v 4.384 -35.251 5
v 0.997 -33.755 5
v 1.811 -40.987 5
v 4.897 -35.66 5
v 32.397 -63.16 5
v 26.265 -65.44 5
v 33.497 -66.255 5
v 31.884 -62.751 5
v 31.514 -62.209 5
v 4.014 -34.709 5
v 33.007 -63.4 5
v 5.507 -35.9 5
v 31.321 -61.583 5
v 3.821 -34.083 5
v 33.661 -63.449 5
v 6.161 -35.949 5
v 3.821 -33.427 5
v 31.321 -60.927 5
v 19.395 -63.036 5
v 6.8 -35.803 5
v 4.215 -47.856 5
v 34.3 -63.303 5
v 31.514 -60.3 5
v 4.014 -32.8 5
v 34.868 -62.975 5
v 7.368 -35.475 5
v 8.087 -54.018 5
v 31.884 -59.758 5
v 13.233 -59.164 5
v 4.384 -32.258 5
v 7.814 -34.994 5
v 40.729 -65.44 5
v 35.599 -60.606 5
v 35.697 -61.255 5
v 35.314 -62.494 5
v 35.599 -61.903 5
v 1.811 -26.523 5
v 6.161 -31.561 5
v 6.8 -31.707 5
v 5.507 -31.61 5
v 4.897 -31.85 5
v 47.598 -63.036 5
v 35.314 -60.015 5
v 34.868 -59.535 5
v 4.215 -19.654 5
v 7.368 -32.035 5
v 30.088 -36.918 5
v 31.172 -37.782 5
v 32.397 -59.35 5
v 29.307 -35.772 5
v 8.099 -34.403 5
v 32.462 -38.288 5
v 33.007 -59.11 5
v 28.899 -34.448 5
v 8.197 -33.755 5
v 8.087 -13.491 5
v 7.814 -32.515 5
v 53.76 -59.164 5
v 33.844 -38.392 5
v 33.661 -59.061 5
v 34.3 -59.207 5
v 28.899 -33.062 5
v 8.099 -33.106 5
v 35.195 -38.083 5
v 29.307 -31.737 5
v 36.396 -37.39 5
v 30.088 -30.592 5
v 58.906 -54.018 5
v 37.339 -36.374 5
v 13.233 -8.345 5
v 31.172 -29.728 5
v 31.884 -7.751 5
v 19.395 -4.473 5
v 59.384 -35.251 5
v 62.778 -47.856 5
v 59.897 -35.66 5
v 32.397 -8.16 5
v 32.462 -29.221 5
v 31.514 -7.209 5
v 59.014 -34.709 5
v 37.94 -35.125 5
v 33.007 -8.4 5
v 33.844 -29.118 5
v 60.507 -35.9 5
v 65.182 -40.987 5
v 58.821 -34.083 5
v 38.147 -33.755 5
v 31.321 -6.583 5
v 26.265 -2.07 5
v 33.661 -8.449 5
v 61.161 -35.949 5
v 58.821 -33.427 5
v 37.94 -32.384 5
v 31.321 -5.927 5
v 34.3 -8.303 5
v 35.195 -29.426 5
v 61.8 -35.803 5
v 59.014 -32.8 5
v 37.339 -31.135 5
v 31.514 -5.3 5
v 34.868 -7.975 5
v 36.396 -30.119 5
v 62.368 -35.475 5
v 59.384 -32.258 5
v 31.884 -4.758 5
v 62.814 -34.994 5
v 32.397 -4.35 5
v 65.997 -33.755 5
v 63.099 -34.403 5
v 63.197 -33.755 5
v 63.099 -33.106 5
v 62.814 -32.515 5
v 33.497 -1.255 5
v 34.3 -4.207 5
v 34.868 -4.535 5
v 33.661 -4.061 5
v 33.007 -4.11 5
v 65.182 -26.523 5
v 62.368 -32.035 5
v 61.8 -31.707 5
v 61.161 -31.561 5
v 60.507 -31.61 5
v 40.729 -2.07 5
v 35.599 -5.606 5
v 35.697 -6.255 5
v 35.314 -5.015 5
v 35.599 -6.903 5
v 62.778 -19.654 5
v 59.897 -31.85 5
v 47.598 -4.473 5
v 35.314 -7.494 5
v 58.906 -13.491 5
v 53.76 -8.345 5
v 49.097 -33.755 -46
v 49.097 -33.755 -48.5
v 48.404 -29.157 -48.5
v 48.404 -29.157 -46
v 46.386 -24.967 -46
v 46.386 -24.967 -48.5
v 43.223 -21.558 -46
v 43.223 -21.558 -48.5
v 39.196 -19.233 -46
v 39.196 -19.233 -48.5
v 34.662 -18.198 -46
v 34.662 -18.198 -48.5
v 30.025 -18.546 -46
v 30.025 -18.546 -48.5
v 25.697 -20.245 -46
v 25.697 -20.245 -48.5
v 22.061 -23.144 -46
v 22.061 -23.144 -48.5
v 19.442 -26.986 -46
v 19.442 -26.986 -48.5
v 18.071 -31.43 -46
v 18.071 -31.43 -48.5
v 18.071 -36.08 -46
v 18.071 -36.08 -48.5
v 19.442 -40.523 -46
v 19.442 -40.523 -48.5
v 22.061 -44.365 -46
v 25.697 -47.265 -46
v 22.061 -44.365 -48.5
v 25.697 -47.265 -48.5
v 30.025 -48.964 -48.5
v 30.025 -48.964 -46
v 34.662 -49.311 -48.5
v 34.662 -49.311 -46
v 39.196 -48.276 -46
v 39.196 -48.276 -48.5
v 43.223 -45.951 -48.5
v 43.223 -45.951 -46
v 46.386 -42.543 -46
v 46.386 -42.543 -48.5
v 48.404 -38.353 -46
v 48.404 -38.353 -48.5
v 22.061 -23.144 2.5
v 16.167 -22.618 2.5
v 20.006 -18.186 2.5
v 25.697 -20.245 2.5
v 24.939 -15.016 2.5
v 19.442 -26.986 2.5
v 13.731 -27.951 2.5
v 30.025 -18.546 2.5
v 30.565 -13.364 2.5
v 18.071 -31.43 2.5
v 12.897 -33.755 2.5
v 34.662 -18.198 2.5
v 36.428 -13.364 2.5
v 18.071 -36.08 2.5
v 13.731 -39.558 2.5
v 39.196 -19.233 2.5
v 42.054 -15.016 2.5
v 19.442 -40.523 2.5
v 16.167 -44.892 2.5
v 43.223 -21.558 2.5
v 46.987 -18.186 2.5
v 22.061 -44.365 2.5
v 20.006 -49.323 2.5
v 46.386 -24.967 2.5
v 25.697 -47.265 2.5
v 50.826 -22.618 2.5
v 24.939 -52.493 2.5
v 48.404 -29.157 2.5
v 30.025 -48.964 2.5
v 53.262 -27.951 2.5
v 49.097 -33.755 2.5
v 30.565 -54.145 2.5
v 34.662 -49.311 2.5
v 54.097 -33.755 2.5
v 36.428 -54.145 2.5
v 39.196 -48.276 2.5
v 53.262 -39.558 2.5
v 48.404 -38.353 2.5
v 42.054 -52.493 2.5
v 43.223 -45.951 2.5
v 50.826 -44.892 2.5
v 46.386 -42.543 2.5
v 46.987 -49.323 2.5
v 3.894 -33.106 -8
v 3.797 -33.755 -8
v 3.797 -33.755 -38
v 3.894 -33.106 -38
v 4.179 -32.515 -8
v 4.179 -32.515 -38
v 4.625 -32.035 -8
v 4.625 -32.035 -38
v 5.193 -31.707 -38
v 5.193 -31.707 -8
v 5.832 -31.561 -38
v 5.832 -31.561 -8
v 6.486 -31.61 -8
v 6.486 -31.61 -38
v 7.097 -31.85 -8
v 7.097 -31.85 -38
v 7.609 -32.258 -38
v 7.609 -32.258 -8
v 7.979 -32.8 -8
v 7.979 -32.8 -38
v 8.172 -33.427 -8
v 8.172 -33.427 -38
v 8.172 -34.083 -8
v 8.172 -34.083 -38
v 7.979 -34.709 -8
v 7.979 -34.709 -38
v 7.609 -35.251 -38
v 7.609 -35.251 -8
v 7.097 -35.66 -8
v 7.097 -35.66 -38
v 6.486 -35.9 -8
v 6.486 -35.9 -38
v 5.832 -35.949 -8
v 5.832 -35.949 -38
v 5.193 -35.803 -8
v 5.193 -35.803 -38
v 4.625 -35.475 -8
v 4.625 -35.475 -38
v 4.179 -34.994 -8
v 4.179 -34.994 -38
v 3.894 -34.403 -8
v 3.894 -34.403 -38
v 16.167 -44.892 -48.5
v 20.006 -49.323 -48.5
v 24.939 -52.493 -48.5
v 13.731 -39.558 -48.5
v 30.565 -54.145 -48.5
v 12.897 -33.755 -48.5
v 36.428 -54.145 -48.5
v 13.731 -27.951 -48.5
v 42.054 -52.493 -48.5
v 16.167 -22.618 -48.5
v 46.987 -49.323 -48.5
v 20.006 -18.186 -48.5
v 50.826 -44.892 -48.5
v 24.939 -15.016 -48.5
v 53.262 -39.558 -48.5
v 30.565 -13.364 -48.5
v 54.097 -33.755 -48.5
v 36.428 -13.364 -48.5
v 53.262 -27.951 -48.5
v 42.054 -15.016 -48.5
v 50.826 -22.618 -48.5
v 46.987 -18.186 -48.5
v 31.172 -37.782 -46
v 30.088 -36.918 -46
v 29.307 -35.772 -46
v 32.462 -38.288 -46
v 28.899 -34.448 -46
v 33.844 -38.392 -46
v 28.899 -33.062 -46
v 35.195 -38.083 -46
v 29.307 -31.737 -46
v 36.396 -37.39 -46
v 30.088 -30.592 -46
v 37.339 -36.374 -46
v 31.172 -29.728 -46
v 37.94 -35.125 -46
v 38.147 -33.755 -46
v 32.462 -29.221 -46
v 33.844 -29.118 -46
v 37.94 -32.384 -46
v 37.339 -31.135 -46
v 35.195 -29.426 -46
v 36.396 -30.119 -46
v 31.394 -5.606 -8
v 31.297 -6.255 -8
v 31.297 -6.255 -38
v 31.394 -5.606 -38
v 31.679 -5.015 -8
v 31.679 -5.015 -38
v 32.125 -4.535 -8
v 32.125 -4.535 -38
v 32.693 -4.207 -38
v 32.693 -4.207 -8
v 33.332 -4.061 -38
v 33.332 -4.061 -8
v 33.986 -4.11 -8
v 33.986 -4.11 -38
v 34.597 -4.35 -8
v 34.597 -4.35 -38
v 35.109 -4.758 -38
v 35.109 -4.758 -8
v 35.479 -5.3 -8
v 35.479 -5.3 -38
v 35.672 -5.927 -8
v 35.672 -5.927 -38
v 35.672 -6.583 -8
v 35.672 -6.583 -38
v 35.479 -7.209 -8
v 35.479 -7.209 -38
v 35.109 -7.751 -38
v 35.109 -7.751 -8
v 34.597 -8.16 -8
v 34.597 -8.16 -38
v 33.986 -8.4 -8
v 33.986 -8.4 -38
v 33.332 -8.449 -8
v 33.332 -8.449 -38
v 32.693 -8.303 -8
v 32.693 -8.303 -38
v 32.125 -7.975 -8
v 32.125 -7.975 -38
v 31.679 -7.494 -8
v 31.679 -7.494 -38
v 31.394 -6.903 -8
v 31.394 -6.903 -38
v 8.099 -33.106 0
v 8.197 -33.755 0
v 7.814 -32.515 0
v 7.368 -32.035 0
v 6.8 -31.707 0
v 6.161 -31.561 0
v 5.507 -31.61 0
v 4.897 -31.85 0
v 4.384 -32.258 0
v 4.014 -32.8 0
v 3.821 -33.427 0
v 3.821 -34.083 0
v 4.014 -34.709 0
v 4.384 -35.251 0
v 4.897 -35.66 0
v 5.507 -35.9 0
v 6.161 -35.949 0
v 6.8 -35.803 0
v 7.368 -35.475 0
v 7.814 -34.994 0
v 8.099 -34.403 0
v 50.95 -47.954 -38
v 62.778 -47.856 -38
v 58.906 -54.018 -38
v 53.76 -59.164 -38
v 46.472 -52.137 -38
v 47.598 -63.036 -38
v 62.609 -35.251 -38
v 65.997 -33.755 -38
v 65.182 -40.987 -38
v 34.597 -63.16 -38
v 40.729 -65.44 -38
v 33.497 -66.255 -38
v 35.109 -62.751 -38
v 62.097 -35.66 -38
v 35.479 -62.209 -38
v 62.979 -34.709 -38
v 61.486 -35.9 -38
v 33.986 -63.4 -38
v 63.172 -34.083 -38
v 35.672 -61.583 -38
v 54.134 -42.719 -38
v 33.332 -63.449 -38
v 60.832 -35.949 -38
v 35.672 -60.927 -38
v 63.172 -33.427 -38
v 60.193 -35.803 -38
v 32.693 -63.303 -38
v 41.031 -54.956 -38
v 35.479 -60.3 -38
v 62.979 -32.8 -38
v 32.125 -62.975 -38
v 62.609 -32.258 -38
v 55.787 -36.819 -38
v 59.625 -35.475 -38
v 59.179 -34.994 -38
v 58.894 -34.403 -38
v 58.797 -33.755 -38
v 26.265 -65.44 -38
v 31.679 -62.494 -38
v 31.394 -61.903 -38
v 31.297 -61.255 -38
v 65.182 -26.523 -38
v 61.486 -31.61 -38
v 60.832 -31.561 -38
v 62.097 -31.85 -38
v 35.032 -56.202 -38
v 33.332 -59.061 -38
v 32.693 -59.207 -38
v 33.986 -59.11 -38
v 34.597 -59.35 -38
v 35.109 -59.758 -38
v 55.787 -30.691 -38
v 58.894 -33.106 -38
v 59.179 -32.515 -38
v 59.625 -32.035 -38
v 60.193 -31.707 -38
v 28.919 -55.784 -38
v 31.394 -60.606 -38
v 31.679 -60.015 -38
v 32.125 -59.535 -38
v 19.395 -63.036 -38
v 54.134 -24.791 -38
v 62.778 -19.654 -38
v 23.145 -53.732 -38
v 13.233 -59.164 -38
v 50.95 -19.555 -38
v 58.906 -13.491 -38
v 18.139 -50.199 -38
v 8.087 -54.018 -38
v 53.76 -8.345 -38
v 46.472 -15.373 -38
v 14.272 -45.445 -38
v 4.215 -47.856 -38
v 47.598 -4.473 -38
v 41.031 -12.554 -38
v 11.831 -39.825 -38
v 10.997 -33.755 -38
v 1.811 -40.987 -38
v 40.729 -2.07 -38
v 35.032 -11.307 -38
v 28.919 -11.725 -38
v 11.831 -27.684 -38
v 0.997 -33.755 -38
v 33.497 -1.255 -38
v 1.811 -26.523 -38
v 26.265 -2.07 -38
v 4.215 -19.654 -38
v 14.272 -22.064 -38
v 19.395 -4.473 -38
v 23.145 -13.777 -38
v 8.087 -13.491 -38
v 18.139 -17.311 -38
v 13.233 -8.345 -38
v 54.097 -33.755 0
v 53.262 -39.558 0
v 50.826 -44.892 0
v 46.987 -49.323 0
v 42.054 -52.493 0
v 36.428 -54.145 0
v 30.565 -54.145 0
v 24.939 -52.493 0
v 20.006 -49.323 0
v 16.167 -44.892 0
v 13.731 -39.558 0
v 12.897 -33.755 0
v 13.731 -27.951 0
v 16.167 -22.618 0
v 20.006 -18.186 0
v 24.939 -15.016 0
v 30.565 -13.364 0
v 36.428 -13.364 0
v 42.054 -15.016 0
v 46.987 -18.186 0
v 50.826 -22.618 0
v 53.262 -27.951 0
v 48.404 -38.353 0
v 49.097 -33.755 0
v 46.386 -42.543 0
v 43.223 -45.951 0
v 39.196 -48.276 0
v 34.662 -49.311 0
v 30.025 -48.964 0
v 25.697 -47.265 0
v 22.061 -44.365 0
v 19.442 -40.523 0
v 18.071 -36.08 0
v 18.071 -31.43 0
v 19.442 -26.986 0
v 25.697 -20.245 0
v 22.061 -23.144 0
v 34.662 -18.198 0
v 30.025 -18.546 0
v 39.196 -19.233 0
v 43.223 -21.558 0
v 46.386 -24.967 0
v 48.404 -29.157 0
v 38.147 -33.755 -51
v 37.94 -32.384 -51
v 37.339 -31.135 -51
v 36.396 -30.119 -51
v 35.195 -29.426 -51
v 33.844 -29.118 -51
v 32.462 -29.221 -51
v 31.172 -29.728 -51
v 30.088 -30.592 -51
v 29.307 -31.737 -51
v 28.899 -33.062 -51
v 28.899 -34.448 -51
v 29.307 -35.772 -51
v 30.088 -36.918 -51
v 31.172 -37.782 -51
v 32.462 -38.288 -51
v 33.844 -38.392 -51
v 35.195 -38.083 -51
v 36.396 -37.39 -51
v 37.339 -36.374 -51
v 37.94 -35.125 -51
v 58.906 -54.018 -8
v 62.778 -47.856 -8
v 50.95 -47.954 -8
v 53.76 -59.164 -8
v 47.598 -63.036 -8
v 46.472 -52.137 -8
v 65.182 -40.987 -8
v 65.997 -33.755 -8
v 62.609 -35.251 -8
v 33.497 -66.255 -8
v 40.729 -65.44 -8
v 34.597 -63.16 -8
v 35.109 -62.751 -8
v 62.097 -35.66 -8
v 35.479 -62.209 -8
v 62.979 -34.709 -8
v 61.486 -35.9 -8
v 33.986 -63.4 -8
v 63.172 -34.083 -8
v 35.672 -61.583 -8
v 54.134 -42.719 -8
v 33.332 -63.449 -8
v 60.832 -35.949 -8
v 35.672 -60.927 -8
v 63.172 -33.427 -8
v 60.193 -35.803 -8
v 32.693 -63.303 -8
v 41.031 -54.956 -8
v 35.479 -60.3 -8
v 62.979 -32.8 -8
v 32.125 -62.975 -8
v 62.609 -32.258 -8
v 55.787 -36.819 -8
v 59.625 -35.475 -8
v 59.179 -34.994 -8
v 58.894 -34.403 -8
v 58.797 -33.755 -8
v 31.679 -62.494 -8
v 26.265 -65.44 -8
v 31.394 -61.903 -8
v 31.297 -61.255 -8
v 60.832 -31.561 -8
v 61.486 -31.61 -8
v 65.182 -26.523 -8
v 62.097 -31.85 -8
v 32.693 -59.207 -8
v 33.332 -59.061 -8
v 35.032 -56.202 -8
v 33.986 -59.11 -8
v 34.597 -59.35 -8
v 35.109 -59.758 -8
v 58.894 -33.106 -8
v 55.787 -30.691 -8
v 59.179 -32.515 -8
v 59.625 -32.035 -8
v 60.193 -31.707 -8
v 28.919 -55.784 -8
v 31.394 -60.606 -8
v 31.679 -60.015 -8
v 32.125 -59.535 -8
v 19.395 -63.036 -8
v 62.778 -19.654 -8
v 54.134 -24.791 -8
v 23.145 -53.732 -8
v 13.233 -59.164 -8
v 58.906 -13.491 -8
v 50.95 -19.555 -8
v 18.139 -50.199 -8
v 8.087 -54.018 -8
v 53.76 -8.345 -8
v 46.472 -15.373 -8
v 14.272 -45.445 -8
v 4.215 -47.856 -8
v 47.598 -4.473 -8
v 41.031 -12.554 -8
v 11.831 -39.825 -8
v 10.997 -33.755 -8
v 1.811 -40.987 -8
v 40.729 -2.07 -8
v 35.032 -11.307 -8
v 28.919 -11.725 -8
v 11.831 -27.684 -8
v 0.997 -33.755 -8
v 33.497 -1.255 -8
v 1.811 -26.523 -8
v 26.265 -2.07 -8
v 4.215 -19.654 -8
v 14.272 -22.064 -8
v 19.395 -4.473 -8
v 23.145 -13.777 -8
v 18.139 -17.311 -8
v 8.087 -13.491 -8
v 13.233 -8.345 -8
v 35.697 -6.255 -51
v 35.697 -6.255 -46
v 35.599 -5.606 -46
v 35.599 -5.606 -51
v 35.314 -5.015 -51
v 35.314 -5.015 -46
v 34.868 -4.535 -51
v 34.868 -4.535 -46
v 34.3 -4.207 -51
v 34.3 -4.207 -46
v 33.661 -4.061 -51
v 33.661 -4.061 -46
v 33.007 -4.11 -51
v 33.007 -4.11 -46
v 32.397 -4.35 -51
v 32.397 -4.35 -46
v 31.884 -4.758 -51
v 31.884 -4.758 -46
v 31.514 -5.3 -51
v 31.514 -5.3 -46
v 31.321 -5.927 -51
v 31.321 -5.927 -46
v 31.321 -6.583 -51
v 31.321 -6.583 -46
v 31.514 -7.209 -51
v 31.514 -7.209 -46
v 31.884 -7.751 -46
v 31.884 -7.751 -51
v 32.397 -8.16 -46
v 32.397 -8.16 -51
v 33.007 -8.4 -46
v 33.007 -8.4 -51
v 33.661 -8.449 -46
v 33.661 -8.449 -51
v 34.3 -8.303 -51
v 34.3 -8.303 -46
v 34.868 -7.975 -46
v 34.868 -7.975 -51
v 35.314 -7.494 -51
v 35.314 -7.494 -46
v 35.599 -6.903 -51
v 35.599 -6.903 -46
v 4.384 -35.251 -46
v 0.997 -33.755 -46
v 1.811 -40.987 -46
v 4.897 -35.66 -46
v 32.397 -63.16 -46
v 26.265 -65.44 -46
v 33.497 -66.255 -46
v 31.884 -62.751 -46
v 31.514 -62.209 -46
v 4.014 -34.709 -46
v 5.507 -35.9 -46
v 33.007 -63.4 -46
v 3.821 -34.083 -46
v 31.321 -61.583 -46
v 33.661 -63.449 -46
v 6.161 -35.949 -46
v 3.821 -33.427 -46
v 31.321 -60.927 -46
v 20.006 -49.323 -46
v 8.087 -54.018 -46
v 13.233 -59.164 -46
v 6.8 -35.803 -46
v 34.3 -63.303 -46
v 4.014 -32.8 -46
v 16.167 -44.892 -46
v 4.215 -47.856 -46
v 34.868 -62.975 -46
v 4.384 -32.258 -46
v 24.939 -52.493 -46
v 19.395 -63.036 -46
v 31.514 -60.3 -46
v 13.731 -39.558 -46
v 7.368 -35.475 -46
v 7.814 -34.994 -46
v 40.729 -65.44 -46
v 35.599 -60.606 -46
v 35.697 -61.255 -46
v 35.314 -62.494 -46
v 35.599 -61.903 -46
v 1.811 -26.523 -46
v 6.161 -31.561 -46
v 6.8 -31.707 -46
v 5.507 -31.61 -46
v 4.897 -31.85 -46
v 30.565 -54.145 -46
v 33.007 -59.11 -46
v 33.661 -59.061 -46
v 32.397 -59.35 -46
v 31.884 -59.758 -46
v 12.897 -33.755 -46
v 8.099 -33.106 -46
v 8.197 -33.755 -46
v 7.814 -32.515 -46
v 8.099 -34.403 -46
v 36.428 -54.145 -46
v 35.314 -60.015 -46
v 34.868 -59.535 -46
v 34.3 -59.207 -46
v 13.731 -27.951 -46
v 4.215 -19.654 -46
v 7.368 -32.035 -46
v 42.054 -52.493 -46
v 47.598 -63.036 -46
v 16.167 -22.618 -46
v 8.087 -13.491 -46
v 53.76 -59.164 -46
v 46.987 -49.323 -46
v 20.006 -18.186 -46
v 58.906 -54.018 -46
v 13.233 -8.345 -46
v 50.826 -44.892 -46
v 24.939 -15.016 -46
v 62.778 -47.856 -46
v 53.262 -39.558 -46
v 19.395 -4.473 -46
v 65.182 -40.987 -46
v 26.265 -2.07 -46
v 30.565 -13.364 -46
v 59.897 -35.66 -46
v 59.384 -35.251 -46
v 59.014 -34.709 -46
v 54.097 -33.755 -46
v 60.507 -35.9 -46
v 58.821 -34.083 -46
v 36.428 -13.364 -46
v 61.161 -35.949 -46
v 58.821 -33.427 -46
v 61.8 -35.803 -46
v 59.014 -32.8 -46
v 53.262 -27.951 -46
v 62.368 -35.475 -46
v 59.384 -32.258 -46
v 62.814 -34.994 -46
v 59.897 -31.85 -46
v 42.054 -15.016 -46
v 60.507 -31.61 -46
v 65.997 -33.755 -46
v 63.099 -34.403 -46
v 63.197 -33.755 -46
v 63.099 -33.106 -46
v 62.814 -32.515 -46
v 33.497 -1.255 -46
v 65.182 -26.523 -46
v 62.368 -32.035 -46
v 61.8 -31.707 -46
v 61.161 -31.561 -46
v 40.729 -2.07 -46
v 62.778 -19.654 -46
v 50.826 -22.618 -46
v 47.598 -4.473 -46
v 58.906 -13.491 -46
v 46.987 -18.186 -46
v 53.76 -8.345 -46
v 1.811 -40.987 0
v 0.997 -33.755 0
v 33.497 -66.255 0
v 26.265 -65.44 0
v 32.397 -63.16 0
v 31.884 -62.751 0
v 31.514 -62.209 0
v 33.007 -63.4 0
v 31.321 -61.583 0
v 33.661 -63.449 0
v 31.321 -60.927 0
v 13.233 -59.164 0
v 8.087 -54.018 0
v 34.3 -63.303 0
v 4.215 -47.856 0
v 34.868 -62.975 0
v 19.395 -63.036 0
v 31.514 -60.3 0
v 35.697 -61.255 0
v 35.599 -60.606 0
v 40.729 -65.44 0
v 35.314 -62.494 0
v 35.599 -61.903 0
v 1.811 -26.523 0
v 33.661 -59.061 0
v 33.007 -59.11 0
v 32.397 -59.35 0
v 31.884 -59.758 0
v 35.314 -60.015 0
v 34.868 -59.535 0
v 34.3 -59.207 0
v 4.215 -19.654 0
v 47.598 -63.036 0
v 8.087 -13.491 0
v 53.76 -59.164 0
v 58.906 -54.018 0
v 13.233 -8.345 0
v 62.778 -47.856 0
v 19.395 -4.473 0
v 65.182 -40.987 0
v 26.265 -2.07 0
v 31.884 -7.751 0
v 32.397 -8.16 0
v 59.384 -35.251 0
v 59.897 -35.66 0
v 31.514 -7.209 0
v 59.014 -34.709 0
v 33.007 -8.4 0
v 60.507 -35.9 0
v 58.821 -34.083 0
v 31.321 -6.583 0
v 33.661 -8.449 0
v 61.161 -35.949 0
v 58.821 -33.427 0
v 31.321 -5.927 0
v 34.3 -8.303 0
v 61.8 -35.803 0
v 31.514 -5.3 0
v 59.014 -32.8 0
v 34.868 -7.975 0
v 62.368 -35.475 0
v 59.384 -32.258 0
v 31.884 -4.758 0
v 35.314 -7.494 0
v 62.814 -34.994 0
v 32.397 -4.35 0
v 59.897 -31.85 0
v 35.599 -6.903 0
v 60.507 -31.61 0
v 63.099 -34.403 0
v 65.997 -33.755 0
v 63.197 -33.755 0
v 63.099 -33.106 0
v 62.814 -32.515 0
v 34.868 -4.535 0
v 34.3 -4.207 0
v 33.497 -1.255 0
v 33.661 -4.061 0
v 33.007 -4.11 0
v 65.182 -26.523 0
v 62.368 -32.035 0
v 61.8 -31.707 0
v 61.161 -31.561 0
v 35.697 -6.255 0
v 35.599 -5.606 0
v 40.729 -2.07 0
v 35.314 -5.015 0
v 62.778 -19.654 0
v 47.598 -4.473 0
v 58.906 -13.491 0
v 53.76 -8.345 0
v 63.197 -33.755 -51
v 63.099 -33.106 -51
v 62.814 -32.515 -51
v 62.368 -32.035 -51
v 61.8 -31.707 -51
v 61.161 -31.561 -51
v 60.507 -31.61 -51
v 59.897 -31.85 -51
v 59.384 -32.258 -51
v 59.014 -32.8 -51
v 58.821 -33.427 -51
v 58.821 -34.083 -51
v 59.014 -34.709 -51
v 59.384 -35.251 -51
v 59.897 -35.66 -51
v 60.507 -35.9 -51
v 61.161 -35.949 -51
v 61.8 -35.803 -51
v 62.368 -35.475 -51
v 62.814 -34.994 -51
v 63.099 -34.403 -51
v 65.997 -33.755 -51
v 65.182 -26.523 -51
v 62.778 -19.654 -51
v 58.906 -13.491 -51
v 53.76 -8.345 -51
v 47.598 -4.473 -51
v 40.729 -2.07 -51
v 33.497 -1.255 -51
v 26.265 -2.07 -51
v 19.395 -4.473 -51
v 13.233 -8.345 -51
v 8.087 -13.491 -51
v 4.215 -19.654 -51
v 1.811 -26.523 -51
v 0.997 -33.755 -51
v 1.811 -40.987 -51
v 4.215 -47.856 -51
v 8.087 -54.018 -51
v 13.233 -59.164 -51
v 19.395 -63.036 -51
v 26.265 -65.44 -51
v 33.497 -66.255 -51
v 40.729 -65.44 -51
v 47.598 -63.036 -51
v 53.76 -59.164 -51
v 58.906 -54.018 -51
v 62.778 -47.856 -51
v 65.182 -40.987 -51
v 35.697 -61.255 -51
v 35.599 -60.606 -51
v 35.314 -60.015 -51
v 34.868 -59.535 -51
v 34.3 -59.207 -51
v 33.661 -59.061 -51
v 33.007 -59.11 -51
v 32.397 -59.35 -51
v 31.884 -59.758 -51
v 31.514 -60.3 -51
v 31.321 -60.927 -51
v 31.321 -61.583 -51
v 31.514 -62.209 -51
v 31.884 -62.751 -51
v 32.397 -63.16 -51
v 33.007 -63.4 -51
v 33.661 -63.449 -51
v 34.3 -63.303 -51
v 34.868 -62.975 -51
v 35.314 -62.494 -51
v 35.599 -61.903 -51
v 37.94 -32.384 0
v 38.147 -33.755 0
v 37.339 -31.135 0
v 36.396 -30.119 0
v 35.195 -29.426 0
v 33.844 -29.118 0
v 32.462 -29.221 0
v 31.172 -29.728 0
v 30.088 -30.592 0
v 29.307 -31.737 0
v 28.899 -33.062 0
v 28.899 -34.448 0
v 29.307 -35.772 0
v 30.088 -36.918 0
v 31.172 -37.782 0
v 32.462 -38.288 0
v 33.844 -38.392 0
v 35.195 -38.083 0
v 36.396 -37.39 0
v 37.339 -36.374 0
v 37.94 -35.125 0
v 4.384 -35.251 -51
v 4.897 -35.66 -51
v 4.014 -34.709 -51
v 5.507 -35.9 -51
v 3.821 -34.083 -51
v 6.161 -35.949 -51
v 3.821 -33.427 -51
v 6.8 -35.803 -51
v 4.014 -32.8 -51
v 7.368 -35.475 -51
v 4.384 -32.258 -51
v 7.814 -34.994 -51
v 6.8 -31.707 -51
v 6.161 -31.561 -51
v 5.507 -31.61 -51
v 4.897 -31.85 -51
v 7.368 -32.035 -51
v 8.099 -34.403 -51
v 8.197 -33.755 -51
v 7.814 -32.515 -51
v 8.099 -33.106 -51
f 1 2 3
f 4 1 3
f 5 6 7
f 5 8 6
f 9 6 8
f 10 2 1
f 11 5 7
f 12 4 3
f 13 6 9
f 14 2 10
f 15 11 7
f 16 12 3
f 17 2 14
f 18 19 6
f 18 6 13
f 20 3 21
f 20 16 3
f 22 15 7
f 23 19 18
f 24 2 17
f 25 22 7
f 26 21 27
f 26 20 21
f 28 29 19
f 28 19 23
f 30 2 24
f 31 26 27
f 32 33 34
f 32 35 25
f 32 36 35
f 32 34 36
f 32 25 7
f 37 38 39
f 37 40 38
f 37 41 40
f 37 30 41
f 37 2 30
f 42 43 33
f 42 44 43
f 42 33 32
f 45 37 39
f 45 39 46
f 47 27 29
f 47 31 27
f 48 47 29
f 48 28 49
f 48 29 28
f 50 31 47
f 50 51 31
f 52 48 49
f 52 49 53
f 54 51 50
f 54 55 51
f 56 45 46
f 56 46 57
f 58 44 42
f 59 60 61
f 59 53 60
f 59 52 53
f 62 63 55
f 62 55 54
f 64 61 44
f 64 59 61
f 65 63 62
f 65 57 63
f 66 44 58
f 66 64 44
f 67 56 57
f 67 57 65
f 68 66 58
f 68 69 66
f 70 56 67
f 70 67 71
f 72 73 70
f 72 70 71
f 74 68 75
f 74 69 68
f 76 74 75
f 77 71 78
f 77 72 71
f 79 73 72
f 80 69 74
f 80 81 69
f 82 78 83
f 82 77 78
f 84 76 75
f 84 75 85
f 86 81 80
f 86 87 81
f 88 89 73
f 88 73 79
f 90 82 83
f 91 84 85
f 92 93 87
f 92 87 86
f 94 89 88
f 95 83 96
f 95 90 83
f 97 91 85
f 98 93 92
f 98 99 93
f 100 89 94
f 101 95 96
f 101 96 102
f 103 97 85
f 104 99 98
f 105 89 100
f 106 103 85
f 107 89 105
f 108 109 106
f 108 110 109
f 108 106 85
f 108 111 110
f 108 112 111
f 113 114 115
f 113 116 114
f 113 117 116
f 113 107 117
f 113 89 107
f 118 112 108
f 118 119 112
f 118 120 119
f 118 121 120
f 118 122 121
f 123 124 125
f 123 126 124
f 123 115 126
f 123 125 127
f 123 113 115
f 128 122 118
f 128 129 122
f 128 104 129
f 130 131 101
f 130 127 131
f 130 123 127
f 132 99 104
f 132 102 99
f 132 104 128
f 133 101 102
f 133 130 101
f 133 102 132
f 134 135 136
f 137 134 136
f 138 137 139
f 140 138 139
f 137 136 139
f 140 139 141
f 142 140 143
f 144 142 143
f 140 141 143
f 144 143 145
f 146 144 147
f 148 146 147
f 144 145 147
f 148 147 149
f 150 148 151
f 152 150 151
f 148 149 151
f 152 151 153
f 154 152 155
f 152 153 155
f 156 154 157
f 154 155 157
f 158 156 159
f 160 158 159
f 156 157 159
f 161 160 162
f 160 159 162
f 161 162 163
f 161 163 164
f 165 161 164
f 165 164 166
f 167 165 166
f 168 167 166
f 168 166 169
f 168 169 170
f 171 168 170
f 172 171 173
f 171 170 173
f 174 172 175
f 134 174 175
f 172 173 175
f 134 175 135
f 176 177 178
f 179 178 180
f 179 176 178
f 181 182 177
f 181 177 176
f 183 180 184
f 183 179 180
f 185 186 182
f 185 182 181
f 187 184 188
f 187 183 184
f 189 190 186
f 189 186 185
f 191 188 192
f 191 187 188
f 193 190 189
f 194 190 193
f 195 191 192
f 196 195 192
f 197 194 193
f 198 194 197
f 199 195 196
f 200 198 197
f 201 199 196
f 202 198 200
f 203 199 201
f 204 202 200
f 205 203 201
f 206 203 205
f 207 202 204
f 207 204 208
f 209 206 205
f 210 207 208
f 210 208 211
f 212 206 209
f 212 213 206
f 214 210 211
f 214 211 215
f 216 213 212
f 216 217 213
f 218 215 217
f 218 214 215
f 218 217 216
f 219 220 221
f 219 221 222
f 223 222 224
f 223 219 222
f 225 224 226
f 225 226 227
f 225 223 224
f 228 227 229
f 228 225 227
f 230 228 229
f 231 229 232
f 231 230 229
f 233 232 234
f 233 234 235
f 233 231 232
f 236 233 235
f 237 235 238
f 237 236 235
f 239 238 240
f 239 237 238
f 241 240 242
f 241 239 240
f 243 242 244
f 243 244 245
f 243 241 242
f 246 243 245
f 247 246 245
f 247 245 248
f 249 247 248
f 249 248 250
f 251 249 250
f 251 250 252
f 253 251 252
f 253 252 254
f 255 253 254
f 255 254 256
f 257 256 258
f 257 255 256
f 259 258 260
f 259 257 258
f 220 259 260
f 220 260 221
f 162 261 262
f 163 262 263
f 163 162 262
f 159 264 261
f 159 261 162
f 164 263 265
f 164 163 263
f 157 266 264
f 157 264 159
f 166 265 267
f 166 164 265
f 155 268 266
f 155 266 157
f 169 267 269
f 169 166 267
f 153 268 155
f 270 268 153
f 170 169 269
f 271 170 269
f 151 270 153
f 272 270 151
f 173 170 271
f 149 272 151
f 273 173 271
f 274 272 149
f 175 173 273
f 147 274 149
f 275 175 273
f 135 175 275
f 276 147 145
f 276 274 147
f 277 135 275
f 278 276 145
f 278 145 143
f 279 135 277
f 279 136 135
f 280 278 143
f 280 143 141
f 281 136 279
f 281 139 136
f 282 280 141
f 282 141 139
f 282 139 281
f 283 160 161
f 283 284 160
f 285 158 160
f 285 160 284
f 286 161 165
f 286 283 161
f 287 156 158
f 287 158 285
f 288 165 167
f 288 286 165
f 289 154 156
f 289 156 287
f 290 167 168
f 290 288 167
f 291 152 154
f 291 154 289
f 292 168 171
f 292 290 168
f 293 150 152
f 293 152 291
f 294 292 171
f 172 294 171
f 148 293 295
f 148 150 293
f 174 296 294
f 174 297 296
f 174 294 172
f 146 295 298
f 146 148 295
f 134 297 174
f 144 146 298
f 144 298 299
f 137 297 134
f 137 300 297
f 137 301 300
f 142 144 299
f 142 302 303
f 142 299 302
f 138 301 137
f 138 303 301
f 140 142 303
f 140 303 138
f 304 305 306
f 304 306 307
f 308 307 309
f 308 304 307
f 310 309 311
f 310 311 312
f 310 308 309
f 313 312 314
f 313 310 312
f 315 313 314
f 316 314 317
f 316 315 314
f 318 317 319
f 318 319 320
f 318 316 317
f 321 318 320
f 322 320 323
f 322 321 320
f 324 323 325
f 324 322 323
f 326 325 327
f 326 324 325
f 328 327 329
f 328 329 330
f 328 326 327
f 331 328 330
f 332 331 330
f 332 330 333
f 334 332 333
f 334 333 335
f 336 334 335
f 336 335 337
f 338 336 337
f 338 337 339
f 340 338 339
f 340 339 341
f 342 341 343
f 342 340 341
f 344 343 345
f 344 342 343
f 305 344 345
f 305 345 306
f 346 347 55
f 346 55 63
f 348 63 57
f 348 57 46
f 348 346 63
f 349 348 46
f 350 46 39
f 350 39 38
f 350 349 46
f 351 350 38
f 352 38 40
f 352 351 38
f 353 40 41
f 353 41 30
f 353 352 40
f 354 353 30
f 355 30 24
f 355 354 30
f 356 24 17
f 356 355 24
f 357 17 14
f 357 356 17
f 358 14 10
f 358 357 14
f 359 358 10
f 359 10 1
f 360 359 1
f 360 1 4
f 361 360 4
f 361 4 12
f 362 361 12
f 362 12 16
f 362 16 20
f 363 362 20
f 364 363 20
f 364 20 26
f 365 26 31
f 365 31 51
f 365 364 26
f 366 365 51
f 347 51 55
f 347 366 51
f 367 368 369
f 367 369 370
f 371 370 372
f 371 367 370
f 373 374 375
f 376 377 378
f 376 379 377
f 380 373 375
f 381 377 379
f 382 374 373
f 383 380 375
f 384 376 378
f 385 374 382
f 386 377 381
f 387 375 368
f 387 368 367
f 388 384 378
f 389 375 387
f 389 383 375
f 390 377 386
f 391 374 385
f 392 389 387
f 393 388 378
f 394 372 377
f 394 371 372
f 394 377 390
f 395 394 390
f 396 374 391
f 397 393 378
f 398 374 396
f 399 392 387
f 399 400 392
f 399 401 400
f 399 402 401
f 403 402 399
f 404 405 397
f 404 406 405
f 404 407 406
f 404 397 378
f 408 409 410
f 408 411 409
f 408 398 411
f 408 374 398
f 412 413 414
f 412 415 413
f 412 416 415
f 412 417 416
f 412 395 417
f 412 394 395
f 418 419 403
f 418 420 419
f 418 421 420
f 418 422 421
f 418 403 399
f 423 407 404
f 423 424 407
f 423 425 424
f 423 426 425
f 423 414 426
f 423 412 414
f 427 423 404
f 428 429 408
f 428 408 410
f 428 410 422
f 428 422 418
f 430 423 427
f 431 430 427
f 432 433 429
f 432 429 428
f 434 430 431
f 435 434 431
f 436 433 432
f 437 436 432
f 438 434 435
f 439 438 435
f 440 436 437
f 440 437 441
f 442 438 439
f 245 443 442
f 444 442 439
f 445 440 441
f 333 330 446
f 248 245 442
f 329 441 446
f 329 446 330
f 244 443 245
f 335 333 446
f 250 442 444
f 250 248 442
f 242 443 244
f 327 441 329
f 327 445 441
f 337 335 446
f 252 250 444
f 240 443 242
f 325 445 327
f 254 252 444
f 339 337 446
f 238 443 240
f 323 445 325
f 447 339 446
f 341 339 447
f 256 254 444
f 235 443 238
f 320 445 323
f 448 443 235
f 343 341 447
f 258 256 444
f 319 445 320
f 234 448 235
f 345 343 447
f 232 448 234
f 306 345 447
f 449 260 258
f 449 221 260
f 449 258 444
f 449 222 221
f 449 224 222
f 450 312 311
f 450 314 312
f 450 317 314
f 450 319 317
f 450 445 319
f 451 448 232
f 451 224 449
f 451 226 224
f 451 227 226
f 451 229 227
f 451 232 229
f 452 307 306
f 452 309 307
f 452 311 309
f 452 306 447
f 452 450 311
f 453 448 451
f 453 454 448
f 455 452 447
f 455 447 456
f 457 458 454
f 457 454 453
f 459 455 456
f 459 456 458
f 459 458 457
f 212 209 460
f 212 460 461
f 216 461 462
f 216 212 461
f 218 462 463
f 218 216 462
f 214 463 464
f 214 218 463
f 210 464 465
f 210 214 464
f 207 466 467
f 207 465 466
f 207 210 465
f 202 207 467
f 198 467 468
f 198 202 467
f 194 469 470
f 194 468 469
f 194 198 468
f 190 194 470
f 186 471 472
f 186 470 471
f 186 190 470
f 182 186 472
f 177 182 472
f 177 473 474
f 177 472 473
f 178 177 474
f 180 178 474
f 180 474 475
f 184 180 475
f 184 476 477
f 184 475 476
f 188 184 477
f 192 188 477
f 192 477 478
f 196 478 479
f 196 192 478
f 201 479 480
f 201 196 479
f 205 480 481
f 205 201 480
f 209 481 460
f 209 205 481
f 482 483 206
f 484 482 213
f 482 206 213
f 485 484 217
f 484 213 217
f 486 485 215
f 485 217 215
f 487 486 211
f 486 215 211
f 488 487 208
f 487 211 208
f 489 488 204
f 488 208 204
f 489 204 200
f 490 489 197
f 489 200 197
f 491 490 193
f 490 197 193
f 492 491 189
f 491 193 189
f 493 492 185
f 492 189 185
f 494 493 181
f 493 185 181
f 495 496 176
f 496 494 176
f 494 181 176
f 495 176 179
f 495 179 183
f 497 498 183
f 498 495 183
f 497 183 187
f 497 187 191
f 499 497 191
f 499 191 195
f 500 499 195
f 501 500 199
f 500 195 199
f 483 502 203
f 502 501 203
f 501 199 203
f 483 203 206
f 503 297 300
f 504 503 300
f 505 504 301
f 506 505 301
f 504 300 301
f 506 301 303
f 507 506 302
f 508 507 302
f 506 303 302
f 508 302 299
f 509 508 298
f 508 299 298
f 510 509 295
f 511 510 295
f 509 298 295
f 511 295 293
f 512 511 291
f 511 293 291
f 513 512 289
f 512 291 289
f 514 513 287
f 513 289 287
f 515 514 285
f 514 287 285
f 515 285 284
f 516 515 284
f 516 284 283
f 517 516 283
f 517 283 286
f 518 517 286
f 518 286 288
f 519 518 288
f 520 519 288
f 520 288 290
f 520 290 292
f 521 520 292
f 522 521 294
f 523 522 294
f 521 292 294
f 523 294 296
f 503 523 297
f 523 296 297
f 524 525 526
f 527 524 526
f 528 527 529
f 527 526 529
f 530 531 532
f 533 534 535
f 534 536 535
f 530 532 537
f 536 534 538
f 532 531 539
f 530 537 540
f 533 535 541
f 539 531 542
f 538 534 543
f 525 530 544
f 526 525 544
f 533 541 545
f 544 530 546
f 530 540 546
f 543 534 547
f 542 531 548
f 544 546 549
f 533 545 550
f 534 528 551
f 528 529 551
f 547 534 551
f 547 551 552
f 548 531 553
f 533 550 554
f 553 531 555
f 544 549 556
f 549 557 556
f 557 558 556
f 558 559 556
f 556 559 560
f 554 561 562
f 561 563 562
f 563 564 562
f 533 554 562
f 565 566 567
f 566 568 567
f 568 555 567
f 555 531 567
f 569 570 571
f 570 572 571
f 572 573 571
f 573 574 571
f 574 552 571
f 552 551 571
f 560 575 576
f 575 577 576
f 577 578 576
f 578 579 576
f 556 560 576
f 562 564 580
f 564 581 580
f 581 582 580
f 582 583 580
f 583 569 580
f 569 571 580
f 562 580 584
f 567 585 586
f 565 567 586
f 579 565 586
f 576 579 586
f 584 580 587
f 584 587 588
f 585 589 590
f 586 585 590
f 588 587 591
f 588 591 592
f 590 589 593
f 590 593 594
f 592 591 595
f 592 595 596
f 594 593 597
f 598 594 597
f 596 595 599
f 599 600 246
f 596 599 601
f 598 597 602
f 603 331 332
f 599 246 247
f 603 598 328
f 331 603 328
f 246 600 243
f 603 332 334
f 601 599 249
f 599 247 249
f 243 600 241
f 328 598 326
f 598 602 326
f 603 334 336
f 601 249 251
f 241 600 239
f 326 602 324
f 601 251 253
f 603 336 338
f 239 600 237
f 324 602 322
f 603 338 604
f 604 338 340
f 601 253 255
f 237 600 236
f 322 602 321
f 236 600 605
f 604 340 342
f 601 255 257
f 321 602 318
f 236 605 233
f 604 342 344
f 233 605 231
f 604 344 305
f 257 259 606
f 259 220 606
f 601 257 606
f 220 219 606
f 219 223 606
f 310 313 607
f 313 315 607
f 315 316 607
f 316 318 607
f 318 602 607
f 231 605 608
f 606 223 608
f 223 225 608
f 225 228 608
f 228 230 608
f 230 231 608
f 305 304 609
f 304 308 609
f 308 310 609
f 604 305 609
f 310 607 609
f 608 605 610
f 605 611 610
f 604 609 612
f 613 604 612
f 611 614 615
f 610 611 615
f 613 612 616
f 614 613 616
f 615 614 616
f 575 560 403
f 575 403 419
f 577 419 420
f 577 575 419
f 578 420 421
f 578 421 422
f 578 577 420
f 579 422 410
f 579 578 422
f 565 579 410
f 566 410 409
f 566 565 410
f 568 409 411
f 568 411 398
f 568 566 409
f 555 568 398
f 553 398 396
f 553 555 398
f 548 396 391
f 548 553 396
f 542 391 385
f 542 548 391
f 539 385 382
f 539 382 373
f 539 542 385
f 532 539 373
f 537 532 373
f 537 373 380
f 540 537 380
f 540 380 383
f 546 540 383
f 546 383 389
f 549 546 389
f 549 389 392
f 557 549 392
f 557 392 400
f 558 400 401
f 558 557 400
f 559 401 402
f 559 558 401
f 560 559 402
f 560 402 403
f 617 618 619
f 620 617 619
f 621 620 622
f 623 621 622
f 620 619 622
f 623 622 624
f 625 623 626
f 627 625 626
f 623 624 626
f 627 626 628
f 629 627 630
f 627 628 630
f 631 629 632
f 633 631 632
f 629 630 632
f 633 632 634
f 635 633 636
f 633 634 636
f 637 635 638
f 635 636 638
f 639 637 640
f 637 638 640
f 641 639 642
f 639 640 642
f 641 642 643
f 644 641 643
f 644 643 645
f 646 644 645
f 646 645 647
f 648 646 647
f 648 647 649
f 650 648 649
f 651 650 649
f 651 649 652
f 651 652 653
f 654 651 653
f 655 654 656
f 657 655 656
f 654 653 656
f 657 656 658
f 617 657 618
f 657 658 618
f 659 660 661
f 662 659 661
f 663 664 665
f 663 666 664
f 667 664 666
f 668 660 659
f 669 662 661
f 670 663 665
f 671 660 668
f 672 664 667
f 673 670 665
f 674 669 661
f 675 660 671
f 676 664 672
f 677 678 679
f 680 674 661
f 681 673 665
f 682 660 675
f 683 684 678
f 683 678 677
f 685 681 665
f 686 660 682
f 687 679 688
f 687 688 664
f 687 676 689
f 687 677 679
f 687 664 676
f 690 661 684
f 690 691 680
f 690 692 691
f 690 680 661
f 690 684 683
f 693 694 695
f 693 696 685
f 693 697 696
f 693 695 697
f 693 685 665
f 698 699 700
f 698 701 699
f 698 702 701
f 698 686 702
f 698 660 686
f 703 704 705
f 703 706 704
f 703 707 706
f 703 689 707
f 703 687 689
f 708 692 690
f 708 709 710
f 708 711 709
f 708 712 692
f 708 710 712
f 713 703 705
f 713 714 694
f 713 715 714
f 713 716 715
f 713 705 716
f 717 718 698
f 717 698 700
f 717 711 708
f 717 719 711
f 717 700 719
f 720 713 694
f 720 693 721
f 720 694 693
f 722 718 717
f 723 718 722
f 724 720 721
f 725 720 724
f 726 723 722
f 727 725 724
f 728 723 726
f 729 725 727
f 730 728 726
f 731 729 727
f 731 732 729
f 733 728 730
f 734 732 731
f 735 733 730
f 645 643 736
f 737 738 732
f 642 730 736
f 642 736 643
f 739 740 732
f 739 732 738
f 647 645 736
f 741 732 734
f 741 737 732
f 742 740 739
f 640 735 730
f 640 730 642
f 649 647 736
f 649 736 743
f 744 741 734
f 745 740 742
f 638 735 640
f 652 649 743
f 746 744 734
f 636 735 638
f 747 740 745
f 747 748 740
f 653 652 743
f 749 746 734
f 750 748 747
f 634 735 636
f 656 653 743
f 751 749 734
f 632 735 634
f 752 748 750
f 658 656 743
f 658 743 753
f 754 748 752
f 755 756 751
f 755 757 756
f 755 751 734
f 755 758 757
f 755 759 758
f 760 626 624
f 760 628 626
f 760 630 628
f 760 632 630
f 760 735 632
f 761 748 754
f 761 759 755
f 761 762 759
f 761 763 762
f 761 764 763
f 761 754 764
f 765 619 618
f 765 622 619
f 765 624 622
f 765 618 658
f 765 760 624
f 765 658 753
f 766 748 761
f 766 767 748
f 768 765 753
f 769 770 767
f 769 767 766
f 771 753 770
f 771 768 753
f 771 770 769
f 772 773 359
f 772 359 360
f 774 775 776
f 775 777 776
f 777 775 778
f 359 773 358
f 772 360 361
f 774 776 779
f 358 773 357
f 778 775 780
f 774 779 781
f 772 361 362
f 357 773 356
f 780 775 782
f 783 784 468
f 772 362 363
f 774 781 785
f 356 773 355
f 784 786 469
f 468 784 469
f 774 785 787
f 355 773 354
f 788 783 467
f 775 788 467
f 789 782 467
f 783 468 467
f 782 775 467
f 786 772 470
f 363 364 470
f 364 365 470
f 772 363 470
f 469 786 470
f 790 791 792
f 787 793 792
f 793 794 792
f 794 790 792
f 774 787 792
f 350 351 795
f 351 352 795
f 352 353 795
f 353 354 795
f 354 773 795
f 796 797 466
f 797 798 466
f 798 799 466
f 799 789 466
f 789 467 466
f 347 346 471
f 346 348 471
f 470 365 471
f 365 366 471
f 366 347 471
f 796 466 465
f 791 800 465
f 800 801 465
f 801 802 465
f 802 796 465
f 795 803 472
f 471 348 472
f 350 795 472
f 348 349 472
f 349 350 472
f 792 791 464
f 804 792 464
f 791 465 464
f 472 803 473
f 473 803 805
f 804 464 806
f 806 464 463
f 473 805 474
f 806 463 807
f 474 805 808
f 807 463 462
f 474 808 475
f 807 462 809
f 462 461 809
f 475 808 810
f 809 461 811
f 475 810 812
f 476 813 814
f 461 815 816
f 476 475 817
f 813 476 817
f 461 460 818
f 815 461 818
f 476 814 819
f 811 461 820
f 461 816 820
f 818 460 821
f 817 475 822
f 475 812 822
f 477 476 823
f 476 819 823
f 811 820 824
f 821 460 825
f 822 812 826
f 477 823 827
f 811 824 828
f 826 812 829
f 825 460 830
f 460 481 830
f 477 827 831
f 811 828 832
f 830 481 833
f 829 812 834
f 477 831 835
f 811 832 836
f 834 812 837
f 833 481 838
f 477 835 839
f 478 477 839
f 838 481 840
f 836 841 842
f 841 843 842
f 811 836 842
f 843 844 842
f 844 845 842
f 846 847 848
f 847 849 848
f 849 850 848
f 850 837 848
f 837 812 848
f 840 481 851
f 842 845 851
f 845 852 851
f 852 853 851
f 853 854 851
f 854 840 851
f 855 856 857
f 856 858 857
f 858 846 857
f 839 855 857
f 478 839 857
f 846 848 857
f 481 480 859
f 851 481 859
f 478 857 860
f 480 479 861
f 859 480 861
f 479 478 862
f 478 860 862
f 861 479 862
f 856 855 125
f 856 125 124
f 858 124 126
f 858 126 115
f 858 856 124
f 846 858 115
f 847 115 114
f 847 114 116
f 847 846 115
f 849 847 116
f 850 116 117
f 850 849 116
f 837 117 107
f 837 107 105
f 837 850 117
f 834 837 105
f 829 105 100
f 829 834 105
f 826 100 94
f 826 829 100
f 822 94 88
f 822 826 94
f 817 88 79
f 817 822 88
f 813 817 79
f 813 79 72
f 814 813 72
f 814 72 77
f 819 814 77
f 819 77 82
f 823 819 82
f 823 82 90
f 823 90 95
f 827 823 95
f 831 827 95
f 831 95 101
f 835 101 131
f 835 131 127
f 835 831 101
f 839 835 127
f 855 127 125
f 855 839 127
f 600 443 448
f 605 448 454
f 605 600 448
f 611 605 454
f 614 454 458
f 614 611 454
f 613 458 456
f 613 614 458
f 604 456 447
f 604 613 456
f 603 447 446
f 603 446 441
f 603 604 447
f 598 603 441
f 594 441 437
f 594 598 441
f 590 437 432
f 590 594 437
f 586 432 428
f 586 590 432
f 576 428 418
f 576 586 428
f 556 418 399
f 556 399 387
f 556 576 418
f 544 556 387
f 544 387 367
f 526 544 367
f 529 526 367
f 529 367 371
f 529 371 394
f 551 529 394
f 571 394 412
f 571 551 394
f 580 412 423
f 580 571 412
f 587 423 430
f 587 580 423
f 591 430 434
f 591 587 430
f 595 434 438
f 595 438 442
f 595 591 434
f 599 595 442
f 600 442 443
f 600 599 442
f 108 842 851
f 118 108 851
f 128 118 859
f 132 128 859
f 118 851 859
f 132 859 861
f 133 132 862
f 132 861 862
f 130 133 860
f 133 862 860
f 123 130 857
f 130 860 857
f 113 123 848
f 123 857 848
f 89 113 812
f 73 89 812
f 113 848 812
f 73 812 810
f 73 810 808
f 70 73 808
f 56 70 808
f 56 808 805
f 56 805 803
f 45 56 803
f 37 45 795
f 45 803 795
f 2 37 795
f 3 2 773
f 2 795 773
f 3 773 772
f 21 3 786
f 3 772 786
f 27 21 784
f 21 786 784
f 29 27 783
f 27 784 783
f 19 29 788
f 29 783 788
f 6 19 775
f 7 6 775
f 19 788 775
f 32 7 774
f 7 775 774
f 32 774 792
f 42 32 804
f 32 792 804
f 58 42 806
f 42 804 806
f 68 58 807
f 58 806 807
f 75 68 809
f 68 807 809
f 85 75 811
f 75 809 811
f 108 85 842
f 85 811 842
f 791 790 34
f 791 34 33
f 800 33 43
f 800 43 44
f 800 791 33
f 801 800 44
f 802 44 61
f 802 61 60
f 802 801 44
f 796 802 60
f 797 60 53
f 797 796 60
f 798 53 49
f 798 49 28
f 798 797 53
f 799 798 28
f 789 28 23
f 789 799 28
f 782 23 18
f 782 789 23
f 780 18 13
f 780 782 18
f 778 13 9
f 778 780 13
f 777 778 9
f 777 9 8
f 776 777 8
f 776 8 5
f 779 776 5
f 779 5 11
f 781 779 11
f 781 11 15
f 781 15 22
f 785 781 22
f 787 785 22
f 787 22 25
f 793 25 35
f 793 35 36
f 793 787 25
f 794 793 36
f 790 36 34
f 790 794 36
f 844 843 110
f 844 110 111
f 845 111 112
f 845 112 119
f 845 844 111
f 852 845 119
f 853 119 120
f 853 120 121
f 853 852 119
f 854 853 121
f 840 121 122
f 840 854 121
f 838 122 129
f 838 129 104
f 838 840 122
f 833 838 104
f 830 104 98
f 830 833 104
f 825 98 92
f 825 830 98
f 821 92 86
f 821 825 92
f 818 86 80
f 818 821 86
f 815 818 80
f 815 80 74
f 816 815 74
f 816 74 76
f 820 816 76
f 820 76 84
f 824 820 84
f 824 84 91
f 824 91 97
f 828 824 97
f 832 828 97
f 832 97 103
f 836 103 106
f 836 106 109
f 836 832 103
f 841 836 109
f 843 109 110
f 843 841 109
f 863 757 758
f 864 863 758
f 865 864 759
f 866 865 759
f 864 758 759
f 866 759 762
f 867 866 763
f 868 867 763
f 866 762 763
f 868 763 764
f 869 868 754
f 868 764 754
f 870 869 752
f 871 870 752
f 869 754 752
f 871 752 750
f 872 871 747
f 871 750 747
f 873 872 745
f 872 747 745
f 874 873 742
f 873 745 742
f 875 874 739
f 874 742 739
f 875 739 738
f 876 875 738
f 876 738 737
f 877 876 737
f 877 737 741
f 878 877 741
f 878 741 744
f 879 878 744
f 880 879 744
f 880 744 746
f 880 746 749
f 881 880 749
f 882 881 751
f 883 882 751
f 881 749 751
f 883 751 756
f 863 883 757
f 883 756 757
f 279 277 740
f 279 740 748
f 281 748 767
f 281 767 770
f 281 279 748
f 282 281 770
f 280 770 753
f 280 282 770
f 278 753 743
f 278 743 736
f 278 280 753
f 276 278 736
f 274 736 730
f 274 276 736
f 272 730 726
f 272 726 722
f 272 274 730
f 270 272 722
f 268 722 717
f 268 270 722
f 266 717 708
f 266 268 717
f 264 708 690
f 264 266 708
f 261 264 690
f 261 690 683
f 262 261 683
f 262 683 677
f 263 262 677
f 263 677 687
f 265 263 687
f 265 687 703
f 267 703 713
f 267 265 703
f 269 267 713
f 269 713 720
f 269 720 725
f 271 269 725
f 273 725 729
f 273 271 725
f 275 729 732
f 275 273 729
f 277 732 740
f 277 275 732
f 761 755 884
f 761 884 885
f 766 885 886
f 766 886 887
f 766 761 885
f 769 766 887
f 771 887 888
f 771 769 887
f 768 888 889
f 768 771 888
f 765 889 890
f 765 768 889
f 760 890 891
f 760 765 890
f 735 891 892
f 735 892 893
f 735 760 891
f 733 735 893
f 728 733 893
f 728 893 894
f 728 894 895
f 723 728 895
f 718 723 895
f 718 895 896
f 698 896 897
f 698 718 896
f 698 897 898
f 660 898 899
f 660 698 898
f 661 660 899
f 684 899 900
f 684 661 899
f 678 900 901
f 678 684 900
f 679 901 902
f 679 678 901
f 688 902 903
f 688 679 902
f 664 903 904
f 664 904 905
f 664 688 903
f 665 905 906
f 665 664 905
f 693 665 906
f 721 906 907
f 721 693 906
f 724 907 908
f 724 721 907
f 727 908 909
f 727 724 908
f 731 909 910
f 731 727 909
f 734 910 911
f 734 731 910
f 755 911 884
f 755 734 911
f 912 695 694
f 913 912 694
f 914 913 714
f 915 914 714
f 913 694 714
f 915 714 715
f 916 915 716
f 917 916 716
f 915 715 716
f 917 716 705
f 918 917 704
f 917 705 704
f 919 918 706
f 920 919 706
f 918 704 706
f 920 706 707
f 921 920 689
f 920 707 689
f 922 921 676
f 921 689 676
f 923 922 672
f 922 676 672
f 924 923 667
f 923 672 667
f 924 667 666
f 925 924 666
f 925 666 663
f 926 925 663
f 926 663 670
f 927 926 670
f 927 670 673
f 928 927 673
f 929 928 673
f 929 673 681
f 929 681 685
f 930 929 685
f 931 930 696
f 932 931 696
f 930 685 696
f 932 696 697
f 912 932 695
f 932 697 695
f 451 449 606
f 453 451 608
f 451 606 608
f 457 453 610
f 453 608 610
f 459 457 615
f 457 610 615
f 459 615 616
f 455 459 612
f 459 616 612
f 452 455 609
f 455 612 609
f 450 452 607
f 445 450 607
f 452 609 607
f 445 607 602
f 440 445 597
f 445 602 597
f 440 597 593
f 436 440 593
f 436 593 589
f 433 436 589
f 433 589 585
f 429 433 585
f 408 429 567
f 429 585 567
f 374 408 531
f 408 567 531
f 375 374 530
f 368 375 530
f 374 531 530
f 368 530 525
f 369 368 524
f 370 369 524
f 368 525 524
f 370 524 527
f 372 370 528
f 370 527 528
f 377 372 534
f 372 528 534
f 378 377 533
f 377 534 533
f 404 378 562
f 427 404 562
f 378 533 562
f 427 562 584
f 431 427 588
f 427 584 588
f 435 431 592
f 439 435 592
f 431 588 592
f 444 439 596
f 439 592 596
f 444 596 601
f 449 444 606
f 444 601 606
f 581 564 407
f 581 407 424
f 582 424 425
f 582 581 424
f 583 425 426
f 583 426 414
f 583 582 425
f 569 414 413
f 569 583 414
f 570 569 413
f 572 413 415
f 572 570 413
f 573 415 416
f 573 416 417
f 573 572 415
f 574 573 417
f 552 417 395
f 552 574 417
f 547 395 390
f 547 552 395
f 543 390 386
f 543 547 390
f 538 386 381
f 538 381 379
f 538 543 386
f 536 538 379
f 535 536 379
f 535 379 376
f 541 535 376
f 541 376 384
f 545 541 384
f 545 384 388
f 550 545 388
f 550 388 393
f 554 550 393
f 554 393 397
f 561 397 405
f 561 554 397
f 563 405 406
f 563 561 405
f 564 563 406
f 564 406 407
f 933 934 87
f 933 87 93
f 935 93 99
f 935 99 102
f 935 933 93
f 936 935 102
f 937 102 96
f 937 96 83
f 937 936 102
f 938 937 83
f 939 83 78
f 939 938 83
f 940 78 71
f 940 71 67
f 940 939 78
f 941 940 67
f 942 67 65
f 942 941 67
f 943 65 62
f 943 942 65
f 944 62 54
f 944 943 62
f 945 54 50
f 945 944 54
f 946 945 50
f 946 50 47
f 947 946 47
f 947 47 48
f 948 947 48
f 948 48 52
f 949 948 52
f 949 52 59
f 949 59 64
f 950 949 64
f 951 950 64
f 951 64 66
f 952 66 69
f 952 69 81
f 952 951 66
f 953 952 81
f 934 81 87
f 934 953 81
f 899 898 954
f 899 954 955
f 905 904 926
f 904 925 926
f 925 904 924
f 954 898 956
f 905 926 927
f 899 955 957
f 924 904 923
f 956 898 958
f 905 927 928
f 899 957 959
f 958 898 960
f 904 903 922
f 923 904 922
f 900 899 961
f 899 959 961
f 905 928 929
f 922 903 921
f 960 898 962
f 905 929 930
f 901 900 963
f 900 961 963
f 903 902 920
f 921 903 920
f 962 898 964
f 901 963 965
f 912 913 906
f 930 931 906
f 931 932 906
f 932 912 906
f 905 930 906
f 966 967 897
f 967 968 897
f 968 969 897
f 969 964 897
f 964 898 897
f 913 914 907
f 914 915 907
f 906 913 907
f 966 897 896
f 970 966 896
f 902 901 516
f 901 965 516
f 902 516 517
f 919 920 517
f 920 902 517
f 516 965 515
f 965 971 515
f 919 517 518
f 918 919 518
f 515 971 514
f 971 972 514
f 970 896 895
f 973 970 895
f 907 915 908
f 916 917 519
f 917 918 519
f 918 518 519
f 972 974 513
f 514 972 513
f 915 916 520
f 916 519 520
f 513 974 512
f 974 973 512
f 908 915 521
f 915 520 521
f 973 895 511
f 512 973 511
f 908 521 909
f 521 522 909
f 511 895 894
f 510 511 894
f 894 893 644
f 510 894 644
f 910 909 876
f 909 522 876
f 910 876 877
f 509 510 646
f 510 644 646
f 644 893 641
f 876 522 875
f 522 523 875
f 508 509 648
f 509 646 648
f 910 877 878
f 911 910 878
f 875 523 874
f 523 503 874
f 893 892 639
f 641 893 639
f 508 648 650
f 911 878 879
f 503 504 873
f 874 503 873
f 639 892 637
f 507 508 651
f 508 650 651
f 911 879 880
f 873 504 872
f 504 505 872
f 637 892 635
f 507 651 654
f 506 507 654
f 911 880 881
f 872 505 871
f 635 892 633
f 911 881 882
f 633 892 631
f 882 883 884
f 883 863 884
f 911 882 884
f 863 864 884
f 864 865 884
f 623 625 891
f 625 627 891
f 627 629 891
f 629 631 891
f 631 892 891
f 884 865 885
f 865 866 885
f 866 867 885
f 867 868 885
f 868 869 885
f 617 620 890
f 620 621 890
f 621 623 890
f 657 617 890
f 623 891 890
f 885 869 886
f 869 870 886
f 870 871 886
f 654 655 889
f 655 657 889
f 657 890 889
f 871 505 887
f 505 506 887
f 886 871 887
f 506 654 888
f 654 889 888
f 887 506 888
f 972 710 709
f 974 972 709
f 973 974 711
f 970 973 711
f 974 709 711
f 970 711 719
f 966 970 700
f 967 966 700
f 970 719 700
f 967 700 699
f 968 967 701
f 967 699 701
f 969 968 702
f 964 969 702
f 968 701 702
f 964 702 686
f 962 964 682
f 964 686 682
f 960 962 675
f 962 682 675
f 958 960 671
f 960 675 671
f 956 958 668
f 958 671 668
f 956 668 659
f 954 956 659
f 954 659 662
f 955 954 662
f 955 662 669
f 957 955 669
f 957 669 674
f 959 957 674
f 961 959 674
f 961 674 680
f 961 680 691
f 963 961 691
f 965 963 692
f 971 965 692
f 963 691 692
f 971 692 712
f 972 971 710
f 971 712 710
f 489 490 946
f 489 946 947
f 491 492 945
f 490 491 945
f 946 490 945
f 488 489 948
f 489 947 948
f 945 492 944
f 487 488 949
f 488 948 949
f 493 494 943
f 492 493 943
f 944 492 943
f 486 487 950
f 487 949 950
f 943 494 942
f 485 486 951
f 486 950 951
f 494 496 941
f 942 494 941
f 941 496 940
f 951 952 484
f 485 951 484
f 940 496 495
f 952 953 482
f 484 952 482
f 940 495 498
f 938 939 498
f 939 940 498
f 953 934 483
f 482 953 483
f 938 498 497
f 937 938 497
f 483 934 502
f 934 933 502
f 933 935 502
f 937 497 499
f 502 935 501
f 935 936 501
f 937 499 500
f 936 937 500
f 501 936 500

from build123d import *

# Parameters (mm, degrees)
SKETCH2_R               = 32.5
SKETCH2_R_2             = 2.2
SKETCH2_R_3             = 4.65
BOSS_EXTRUDE1_DEPTH     = 5
BOSS_EXTRUDE2_START     = 8
SKETCH3_R               = 32.5
SKETCH3_R_2             = 22.5
SKETCH3_R_3             = 2.2
BOSS_EXTRUDE2_DEPTH     = 30
CUT_EXTRUDE1_DEPTH      = 8
CUT_EXTRUDE1_DEPTH_BACK = 2.5
SKETCH4_R               = 20.6
SKETCH4_R_2             = 15.6
CUT_EXTRUDE2_START      = -2.5
SKETCH5_R               = 20.6
SKETCH5_R_2             = 15.6
CUT_EXTRUDE2_DEPTH      = 2.5


with BuildPart() as part:
    # Sketch2 → Boss-Extrude1 (new body)
    with BuildSketch(Plane.XY):
        with Locations((33.49662103, -33.754772237)):
            Circle(SKETCH2_R)
        with Locations((33.49662103, -6.254772237)):
            Circle(SKETCH2_R_2, mode=Mode.SUBTRACT)
        with Locations((5.99662103, -33.754772237)):
            Circle(SKETCH2_R_2, mode=Mode.SUBTRACT)
        with Locations((33.49662103, -61.254772237)):
            Circle(SKETCH2_R_2, mode=Mode.SUBTRACT)
        with Locations((60.99662103, -33.754772237)):
            Circle(SKETCH2_R_2, mode=Mode.SUBTRACT)
        with Locations((33.49662103, -33.754772237)):
            Circle(SKETCH2_R_3, mode=Mode.SUBTRACT)
    extrude(amount=BOSS_EXTRUDE1_DEPTH)


with BuildPart() as body_2:
    # Sketch3 → Boss-Extrude2 (new body)
    with BuildSketch(Plane(origin=(0, 0, 0), x_dir=(-1, 0, 0), z_dir=(0, 0, -1)).offset(BOSS_EXTRUDE2_START)):
        with Locations((-33.49662103, -33.754772237)):
            Circle(SKETCH3_R)
        with Locations((-33.49662103, -33.754772237)):
            Circle(SKETCH3_R_2, mode=Mode.SUBTRACT)
        with Locations((-33.49662103, -6.254772237)):
            Circle(SKETCH3_R_3, mode=Mode.SUBTRACT)
        with Locations((-5.99662103, -33.754772237)):
            Circle(SKETCH3_R_3, mode=Mode.SUBTRACT)
        with Locations((-33.49662103, -61.254772237)):
            Circle(SKETCH3_R_3, mode=Mode.SUBTRACT)
        with Locations((-60.99662103, -33.754772237)):
            Circle(SKETCH3_R_3, mode=Mode.SUBTRACT)
    extrude(amount=BOSS_EXTRUDE2_DEPTH)


with BuildPart() as body_3:
    # Mirror1: mirrored copy
    add(part.part.mirror(Plane(origin=(0, 0, -23), x_dir=(1, 0, 0), z_dir=(0, 0, -1))))

    # Sketch5 → Cut-Extrude2 (cut)
    with BuildSketch(Plane.XY.offset(-46).offset(CUT_EXTRUDE2_START)):
        with Locations((33.49662103, -33.754772237)):
            Circle(SKETCH5_R)
        with Locations((33.49662103, -33.754772237)):
            Circle(SKETCH5_R_2, mode=Mode.SUBTRACT)
    extrude(amount=CUT_EXTRUDE2_DEPTH, mode=Mode.SUBTRACT)


with BuildPart() as part_1:
    add(part.part)

    # Sketch4 → Cut-Extrude1 (cut, two sides: drawn at the far end of the back side and taken through both)
    with BuildSketch(Plane(origin=(0, 0, 0), x_dir=(-1, 0, 0), z_dir=(0, 0, -1)).offset(-CUT_EXTRUDE1_DEPTH_BACK)):
        with Locations(Location((-33.49662103, -33.754772237, 0), (0, 0, 180))):
            Circle(SKETCH4_R)
        with Locations(Location((-33.49662103, -33.754772237, 0), (0, 0, 180))):
            Circle(SKETCH4_R_2, mode=Mode.SUBTRACT)
    extrude(amount=CUT_EXTRUDE1_DEPTH + CUT_EXTRUDE1_DEPTH_BACK, mode=Mode.SUBTRACT)


solid = Compound([body_2.part, body_3.part, part_1.part])
